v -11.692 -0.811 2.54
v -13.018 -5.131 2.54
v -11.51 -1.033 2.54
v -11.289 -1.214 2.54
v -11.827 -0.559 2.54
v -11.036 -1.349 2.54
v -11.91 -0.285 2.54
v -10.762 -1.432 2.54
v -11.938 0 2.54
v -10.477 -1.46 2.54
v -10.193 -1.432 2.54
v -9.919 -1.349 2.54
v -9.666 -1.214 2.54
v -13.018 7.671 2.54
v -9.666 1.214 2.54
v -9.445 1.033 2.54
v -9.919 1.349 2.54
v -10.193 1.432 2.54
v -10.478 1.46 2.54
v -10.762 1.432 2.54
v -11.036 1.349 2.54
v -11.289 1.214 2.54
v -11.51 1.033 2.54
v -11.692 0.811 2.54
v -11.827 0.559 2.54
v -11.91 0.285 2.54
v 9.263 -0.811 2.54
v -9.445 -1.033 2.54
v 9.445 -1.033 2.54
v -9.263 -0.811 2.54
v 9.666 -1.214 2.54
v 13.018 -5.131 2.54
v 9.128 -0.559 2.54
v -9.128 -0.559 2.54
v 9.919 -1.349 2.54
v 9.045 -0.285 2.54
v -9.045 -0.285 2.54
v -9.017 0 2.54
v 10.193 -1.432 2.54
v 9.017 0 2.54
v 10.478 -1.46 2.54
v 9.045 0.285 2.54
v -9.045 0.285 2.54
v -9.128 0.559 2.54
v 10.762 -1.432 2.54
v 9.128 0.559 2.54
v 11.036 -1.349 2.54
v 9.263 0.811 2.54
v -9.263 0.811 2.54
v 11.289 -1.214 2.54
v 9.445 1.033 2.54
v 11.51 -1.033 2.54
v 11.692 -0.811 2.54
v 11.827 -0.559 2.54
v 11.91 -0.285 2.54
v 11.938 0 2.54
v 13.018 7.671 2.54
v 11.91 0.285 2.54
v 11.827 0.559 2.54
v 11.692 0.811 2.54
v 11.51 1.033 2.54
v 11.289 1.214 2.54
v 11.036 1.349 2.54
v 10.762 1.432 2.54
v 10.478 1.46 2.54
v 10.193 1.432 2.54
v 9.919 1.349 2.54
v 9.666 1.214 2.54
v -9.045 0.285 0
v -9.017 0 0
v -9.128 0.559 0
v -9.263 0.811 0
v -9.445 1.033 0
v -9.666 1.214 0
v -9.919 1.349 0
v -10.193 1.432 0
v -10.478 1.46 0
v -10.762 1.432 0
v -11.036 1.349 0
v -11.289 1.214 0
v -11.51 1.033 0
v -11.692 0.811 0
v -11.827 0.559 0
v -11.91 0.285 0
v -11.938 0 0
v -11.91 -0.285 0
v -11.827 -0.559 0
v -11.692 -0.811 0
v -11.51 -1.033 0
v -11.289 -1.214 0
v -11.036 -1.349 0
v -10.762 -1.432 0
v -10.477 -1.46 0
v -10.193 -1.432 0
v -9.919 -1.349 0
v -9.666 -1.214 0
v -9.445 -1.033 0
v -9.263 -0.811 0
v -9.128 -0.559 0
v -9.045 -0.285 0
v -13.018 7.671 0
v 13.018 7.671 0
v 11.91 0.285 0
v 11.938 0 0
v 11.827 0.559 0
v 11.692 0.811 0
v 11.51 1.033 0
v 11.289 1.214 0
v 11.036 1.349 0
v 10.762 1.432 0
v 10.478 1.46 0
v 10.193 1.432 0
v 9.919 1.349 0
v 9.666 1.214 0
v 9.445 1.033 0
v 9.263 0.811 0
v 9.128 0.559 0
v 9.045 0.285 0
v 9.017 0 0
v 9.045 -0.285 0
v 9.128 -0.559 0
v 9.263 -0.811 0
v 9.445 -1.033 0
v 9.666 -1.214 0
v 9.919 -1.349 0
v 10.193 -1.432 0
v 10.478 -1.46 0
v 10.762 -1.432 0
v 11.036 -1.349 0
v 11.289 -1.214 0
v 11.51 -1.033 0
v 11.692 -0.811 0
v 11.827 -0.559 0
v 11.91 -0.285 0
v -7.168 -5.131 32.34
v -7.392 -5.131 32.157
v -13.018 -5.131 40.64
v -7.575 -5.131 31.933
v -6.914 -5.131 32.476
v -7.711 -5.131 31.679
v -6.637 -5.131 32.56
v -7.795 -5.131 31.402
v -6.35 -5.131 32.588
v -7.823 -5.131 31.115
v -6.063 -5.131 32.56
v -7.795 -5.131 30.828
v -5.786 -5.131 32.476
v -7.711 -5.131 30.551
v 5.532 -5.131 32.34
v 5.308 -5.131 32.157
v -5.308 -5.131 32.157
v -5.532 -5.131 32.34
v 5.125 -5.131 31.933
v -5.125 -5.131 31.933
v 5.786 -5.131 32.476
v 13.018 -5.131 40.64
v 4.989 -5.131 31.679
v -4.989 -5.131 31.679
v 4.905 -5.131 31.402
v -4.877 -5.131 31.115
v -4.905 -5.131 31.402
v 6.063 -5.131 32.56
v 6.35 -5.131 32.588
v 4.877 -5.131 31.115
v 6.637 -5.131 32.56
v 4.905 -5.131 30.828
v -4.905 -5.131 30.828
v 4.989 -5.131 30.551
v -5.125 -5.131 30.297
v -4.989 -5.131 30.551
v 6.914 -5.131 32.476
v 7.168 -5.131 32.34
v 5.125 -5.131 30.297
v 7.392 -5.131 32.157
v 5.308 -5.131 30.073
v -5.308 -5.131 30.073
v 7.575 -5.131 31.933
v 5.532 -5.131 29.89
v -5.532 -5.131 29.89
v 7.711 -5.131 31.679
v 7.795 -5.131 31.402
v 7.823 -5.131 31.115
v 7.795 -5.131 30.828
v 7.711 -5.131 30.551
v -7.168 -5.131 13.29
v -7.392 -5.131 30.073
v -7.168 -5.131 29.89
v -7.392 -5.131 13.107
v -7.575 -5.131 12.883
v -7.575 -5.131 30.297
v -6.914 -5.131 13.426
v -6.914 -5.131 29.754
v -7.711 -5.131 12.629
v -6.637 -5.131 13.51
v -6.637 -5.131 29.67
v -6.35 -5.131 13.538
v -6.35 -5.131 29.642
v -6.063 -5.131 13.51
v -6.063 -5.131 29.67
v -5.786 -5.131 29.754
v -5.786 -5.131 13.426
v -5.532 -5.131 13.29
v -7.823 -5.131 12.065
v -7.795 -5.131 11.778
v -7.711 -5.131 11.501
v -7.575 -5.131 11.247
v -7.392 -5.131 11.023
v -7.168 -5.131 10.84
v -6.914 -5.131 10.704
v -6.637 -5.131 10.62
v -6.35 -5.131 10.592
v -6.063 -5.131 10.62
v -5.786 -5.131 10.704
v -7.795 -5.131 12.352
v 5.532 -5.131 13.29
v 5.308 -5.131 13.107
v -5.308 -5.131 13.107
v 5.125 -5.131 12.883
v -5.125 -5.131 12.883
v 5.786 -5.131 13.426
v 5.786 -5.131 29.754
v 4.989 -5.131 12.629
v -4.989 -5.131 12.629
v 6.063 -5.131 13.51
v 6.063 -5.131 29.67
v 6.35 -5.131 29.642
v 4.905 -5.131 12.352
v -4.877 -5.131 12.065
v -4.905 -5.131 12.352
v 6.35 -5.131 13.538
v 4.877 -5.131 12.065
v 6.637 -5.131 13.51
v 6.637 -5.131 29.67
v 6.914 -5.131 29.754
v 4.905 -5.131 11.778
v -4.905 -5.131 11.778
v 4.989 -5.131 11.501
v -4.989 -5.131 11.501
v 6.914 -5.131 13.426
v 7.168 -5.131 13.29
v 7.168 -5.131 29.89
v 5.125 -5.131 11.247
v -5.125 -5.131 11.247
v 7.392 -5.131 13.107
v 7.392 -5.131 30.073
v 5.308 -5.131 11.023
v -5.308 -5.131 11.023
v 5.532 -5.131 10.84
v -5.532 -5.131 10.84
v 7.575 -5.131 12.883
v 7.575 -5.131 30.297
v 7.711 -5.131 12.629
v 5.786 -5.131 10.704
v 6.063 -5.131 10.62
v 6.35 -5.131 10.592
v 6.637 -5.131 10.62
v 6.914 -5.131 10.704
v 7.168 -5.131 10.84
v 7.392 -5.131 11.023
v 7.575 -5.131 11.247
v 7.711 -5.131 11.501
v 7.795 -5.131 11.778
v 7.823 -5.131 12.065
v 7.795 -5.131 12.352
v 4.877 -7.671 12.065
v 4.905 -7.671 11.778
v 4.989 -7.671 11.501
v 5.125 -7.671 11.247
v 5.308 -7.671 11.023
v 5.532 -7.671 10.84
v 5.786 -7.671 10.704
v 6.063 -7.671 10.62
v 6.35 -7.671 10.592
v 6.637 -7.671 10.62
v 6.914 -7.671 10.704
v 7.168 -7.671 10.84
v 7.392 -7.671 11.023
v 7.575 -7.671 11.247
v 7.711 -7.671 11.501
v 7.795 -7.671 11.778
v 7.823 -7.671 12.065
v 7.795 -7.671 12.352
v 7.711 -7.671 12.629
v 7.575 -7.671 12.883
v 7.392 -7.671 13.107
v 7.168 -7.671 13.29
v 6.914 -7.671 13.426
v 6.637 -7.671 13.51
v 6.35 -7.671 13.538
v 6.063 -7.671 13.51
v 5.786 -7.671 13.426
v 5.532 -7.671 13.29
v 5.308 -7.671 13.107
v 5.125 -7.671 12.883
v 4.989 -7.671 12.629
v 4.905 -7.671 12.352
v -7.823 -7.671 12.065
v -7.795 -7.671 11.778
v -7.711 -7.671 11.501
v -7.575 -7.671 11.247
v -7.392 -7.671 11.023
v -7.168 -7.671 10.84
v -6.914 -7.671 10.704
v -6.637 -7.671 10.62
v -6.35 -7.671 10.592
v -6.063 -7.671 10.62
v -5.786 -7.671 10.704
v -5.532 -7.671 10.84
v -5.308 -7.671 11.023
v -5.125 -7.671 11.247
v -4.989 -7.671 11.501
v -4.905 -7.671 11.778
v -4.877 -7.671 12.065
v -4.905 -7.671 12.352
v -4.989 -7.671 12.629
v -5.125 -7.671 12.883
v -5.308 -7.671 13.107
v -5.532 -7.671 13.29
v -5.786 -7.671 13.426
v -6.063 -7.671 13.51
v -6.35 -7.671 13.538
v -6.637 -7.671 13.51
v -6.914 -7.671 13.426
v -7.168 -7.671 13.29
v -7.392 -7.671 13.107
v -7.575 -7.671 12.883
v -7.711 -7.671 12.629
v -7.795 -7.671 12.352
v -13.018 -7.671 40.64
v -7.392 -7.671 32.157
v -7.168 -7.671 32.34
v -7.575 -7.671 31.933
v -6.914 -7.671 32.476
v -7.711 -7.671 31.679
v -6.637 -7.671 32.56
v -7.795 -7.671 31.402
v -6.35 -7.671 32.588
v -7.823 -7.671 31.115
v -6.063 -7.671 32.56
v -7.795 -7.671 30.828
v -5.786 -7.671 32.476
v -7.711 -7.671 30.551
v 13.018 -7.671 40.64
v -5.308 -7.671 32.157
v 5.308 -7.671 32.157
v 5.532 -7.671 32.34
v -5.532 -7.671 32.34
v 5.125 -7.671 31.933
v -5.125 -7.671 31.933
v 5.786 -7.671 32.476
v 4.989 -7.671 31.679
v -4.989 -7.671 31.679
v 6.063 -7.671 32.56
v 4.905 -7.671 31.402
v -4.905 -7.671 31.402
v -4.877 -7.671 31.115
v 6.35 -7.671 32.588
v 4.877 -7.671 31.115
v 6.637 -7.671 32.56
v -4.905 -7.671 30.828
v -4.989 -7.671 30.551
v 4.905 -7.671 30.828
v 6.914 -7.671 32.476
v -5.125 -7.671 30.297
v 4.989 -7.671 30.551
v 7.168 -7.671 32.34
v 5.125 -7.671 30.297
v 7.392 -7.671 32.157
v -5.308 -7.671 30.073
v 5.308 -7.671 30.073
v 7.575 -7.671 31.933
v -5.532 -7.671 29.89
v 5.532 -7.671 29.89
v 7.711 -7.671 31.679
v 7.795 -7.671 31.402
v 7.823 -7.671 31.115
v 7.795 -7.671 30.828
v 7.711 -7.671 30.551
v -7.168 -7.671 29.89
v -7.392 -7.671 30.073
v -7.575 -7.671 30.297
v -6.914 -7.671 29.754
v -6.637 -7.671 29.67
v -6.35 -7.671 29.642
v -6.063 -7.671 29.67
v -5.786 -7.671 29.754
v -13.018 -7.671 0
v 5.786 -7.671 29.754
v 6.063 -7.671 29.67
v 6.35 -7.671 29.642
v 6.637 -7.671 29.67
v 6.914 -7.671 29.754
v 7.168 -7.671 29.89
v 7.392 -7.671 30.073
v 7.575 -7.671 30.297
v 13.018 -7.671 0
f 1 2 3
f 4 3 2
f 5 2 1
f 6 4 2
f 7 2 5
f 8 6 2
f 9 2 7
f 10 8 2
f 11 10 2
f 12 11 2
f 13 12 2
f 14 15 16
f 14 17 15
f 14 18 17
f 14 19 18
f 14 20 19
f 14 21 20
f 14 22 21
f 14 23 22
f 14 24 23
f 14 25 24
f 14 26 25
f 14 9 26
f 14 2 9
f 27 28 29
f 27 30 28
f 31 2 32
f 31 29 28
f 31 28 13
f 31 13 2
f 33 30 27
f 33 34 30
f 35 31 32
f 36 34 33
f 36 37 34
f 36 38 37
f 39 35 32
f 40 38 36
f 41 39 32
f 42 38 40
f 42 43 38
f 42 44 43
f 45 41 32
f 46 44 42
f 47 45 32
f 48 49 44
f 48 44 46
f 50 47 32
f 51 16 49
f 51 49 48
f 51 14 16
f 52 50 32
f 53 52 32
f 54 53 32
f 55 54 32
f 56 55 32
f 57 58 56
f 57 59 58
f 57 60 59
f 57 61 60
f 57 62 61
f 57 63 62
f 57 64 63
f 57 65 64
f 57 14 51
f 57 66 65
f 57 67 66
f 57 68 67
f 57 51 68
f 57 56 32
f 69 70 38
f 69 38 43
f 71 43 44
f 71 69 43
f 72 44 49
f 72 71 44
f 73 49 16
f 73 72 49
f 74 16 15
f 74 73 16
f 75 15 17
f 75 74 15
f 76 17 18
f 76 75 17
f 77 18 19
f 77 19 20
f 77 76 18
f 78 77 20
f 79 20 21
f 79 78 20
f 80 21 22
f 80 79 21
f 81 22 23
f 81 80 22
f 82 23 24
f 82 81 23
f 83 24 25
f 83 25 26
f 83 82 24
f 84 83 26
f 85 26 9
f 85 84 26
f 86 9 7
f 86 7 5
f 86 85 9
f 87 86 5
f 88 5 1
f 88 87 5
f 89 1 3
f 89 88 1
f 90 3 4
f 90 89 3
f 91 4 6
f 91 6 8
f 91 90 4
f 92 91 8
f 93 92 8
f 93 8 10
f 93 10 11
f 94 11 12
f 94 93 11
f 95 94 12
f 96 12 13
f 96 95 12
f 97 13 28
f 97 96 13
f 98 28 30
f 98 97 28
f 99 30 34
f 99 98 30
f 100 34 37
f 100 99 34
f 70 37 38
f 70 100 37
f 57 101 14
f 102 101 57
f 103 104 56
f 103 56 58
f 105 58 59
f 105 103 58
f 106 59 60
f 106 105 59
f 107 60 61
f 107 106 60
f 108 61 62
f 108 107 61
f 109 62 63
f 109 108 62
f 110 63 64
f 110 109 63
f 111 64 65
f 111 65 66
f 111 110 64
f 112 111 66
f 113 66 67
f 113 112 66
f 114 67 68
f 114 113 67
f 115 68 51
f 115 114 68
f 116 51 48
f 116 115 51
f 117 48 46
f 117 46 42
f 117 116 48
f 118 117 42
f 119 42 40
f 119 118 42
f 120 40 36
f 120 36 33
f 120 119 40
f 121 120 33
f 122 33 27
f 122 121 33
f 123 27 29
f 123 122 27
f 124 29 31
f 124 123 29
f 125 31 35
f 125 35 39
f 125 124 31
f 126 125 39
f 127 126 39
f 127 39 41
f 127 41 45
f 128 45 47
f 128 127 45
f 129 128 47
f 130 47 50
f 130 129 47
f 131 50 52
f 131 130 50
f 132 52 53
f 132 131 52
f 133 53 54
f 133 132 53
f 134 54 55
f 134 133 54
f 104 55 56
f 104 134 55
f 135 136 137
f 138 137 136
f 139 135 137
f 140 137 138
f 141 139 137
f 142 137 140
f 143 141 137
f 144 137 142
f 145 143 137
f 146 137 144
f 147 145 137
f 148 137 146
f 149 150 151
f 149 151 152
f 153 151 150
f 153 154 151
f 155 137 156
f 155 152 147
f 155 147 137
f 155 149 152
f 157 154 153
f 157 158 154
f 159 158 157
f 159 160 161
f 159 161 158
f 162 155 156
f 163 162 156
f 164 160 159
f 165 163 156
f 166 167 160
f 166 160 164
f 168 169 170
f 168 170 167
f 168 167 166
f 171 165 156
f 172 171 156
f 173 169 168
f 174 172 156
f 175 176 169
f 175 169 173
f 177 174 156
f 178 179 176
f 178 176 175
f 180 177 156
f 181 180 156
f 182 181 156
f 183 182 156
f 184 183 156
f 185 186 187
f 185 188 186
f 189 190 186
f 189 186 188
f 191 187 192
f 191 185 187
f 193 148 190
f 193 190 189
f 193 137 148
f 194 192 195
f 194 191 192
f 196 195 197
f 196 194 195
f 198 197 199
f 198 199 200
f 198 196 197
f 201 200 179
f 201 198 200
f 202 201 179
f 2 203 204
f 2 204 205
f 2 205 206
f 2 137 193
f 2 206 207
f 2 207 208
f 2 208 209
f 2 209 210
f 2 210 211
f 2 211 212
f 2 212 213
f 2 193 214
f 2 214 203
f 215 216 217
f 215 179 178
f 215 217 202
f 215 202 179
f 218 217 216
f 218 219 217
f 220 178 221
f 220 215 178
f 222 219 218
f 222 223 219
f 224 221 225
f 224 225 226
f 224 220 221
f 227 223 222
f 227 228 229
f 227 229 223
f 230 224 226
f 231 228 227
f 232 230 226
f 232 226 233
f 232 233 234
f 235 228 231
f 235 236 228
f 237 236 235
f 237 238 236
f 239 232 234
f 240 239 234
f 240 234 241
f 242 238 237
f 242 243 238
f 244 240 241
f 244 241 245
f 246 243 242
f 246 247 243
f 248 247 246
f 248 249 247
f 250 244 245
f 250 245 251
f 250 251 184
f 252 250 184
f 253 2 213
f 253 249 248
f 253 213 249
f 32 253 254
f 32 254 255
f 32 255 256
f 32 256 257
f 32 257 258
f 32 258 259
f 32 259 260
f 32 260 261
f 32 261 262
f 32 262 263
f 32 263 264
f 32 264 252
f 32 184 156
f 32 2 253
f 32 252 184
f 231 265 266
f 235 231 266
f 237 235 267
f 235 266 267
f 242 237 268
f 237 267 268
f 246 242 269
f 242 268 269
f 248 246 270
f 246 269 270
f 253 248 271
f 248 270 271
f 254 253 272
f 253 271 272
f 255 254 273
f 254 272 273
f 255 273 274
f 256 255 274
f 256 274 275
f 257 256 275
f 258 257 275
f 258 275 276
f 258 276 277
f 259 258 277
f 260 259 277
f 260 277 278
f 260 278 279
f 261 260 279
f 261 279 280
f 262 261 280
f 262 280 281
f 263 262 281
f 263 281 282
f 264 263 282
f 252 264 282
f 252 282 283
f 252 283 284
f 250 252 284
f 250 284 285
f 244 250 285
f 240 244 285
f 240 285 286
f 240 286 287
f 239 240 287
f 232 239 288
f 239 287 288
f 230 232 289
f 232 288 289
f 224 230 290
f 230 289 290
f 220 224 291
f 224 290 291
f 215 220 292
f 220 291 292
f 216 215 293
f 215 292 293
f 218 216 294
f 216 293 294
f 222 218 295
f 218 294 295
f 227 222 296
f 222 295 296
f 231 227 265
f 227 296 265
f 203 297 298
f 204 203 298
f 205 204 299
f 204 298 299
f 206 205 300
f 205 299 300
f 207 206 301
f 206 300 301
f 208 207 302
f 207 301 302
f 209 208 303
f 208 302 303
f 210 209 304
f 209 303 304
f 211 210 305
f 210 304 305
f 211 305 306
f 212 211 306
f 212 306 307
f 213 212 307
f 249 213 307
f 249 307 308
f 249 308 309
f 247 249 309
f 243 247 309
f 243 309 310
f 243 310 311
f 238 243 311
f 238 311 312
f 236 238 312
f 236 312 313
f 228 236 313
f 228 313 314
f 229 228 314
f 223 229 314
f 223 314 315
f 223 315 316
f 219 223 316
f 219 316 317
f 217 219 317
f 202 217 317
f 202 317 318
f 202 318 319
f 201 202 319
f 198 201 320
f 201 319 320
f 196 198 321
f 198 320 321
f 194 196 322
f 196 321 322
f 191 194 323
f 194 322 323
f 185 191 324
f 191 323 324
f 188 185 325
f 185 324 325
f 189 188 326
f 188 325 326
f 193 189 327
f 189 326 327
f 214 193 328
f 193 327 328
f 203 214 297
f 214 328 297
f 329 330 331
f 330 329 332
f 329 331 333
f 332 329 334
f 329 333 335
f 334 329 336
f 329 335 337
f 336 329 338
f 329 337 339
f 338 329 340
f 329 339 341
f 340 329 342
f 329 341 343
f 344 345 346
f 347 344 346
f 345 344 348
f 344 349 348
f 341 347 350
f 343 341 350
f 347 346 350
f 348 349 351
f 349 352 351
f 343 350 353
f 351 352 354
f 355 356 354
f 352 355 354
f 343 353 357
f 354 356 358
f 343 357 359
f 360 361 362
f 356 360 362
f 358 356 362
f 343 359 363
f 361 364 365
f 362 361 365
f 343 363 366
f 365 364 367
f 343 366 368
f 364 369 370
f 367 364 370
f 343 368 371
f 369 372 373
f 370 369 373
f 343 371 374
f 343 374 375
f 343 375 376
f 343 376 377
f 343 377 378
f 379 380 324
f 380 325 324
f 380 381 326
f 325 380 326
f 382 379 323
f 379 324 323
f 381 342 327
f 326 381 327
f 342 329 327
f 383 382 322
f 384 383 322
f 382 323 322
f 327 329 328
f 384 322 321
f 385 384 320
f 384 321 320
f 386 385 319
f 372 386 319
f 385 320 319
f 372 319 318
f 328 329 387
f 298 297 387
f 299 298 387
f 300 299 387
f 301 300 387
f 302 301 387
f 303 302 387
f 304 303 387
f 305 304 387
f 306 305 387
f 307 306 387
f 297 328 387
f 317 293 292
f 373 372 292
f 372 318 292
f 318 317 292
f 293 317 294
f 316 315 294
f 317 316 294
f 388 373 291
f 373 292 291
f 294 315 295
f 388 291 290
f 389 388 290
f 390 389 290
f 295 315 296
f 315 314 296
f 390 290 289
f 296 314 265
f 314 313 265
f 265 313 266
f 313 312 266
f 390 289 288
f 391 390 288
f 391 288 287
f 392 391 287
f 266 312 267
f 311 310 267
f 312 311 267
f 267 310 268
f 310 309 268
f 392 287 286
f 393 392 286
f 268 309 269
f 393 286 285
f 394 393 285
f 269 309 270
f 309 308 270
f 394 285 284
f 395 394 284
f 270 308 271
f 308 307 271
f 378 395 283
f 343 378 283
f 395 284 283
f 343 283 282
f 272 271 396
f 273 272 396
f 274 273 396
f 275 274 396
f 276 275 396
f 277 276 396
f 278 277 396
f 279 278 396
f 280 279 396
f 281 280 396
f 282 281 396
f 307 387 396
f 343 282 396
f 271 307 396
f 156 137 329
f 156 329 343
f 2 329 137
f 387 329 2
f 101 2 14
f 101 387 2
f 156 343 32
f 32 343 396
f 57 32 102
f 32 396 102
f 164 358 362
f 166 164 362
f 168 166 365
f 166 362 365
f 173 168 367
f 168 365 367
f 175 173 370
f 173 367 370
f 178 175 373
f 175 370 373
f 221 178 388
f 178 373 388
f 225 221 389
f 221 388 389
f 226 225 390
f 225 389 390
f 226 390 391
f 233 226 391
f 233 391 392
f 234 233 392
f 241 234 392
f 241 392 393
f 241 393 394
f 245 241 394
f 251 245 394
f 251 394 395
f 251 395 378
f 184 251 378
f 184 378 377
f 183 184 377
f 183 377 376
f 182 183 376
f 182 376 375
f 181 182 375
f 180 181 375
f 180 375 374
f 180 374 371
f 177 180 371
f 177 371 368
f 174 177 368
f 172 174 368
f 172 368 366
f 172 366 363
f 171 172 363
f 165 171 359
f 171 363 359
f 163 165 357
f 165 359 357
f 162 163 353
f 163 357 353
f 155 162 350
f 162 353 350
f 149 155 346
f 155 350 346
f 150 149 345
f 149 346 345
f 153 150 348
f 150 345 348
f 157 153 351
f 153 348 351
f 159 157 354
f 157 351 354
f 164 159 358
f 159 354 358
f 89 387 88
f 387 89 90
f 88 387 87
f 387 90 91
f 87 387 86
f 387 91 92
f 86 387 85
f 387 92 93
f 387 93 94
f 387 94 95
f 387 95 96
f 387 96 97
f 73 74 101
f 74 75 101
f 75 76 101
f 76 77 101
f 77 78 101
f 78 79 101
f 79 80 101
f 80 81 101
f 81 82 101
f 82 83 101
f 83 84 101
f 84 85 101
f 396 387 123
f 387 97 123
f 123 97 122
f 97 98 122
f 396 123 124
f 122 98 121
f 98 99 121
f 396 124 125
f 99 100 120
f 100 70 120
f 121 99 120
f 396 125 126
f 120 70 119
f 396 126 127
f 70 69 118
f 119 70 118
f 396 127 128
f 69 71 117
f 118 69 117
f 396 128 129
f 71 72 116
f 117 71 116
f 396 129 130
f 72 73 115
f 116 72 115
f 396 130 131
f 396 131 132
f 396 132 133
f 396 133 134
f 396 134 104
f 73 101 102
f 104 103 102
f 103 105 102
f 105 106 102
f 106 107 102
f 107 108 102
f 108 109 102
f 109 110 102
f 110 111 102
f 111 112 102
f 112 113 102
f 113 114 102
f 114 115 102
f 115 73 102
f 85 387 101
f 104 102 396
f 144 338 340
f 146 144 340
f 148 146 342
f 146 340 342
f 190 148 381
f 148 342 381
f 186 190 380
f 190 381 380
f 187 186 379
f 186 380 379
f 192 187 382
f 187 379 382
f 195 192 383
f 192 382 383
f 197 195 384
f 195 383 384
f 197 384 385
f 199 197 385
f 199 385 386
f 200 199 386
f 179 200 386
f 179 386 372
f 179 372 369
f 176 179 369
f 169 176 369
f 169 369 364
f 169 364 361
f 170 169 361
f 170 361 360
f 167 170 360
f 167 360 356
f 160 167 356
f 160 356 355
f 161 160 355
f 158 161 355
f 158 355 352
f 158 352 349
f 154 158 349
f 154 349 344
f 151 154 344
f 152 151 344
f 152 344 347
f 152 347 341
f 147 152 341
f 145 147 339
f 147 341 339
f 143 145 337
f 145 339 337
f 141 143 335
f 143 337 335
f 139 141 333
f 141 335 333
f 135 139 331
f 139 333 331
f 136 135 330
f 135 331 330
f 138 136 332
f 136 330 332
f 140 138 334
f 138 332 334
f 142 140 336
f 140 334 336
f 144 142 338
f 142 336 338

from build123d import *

# Parameters (mm, degrees)
SKETCH2_W                 = 26.035
SKETCH2_H                 = 15.3416
SKETCH2_R                 = 1.4605
BOSS_EXTRUDE1_DEPTH       = 2.54
SKETCH3_W                 = 26.035
SKETCH3_H                 = 2.54
BOSS_EXTRUDE2_DEPTH       = 38.1
F_4_CLEARANCE_HOLE1_D     = 2.9464
F_4_CLEARANCE_HOLE1_DEPTH = 7.62
F_4_CLEARANCE_HOLE1_TIP   = 0.885187864


with BuildPart() as part:
    # Sketch2 → Boss-Extrude1 (new body)
    with BuildSketch(Plane.XY):
        Rectangle(SKETCH2_W, SKETCH2_H)
        with Locations((-10.4775, 0)):
            Circle(SKETCH2_R, mode=Mode.SUBTRACT)
        with Locations((10.4775, 0)):
            Circle(SKETCH2_R, mode=Mode.SUBTRACT)
    extrude(amount=BOSS_EXTRUDE1_DEPTH)

    # Sketch3 → Boss-Extrude2 (add)
    with BuildSketch(Plane.XY.offset(2.54)):
        with Locations((0, -6.4008)):
            Rectangle(SKETCH3_W, SKETCH3_H)
    extrude(amount=BOSS_EXTRUDE2_DEPTH)

    # #4 Clearance Hole1
    with Locations(Plane(origin=(0, -5.1308, 0), x_dir=(1, 0, 0), z_dir=(0, 1, 0))):
        with Locations((-6.35, -12.065), (6.35, -12.065), (-6.35, -31.115), (6.35, -31.115)):
            Hole(F_4_CLEARANCE_HOLE1_D / 2, depth=F_4_CLEARANCE_HOLE1_DEPTH)
            with Locations((0, 0, -(F_4_CLEARANCE_HOLE1_DEPTH + F_4_CLEARANCE_HOLE1_TIP / 2))):  # 118° drill point
                Cone(0, F_4_CLEARANCE_HOLE1_D / 2, F_4_CLEARANCE_HOLE1_TIP, mode=Mode.SUBTRACT)


solid = part.part
